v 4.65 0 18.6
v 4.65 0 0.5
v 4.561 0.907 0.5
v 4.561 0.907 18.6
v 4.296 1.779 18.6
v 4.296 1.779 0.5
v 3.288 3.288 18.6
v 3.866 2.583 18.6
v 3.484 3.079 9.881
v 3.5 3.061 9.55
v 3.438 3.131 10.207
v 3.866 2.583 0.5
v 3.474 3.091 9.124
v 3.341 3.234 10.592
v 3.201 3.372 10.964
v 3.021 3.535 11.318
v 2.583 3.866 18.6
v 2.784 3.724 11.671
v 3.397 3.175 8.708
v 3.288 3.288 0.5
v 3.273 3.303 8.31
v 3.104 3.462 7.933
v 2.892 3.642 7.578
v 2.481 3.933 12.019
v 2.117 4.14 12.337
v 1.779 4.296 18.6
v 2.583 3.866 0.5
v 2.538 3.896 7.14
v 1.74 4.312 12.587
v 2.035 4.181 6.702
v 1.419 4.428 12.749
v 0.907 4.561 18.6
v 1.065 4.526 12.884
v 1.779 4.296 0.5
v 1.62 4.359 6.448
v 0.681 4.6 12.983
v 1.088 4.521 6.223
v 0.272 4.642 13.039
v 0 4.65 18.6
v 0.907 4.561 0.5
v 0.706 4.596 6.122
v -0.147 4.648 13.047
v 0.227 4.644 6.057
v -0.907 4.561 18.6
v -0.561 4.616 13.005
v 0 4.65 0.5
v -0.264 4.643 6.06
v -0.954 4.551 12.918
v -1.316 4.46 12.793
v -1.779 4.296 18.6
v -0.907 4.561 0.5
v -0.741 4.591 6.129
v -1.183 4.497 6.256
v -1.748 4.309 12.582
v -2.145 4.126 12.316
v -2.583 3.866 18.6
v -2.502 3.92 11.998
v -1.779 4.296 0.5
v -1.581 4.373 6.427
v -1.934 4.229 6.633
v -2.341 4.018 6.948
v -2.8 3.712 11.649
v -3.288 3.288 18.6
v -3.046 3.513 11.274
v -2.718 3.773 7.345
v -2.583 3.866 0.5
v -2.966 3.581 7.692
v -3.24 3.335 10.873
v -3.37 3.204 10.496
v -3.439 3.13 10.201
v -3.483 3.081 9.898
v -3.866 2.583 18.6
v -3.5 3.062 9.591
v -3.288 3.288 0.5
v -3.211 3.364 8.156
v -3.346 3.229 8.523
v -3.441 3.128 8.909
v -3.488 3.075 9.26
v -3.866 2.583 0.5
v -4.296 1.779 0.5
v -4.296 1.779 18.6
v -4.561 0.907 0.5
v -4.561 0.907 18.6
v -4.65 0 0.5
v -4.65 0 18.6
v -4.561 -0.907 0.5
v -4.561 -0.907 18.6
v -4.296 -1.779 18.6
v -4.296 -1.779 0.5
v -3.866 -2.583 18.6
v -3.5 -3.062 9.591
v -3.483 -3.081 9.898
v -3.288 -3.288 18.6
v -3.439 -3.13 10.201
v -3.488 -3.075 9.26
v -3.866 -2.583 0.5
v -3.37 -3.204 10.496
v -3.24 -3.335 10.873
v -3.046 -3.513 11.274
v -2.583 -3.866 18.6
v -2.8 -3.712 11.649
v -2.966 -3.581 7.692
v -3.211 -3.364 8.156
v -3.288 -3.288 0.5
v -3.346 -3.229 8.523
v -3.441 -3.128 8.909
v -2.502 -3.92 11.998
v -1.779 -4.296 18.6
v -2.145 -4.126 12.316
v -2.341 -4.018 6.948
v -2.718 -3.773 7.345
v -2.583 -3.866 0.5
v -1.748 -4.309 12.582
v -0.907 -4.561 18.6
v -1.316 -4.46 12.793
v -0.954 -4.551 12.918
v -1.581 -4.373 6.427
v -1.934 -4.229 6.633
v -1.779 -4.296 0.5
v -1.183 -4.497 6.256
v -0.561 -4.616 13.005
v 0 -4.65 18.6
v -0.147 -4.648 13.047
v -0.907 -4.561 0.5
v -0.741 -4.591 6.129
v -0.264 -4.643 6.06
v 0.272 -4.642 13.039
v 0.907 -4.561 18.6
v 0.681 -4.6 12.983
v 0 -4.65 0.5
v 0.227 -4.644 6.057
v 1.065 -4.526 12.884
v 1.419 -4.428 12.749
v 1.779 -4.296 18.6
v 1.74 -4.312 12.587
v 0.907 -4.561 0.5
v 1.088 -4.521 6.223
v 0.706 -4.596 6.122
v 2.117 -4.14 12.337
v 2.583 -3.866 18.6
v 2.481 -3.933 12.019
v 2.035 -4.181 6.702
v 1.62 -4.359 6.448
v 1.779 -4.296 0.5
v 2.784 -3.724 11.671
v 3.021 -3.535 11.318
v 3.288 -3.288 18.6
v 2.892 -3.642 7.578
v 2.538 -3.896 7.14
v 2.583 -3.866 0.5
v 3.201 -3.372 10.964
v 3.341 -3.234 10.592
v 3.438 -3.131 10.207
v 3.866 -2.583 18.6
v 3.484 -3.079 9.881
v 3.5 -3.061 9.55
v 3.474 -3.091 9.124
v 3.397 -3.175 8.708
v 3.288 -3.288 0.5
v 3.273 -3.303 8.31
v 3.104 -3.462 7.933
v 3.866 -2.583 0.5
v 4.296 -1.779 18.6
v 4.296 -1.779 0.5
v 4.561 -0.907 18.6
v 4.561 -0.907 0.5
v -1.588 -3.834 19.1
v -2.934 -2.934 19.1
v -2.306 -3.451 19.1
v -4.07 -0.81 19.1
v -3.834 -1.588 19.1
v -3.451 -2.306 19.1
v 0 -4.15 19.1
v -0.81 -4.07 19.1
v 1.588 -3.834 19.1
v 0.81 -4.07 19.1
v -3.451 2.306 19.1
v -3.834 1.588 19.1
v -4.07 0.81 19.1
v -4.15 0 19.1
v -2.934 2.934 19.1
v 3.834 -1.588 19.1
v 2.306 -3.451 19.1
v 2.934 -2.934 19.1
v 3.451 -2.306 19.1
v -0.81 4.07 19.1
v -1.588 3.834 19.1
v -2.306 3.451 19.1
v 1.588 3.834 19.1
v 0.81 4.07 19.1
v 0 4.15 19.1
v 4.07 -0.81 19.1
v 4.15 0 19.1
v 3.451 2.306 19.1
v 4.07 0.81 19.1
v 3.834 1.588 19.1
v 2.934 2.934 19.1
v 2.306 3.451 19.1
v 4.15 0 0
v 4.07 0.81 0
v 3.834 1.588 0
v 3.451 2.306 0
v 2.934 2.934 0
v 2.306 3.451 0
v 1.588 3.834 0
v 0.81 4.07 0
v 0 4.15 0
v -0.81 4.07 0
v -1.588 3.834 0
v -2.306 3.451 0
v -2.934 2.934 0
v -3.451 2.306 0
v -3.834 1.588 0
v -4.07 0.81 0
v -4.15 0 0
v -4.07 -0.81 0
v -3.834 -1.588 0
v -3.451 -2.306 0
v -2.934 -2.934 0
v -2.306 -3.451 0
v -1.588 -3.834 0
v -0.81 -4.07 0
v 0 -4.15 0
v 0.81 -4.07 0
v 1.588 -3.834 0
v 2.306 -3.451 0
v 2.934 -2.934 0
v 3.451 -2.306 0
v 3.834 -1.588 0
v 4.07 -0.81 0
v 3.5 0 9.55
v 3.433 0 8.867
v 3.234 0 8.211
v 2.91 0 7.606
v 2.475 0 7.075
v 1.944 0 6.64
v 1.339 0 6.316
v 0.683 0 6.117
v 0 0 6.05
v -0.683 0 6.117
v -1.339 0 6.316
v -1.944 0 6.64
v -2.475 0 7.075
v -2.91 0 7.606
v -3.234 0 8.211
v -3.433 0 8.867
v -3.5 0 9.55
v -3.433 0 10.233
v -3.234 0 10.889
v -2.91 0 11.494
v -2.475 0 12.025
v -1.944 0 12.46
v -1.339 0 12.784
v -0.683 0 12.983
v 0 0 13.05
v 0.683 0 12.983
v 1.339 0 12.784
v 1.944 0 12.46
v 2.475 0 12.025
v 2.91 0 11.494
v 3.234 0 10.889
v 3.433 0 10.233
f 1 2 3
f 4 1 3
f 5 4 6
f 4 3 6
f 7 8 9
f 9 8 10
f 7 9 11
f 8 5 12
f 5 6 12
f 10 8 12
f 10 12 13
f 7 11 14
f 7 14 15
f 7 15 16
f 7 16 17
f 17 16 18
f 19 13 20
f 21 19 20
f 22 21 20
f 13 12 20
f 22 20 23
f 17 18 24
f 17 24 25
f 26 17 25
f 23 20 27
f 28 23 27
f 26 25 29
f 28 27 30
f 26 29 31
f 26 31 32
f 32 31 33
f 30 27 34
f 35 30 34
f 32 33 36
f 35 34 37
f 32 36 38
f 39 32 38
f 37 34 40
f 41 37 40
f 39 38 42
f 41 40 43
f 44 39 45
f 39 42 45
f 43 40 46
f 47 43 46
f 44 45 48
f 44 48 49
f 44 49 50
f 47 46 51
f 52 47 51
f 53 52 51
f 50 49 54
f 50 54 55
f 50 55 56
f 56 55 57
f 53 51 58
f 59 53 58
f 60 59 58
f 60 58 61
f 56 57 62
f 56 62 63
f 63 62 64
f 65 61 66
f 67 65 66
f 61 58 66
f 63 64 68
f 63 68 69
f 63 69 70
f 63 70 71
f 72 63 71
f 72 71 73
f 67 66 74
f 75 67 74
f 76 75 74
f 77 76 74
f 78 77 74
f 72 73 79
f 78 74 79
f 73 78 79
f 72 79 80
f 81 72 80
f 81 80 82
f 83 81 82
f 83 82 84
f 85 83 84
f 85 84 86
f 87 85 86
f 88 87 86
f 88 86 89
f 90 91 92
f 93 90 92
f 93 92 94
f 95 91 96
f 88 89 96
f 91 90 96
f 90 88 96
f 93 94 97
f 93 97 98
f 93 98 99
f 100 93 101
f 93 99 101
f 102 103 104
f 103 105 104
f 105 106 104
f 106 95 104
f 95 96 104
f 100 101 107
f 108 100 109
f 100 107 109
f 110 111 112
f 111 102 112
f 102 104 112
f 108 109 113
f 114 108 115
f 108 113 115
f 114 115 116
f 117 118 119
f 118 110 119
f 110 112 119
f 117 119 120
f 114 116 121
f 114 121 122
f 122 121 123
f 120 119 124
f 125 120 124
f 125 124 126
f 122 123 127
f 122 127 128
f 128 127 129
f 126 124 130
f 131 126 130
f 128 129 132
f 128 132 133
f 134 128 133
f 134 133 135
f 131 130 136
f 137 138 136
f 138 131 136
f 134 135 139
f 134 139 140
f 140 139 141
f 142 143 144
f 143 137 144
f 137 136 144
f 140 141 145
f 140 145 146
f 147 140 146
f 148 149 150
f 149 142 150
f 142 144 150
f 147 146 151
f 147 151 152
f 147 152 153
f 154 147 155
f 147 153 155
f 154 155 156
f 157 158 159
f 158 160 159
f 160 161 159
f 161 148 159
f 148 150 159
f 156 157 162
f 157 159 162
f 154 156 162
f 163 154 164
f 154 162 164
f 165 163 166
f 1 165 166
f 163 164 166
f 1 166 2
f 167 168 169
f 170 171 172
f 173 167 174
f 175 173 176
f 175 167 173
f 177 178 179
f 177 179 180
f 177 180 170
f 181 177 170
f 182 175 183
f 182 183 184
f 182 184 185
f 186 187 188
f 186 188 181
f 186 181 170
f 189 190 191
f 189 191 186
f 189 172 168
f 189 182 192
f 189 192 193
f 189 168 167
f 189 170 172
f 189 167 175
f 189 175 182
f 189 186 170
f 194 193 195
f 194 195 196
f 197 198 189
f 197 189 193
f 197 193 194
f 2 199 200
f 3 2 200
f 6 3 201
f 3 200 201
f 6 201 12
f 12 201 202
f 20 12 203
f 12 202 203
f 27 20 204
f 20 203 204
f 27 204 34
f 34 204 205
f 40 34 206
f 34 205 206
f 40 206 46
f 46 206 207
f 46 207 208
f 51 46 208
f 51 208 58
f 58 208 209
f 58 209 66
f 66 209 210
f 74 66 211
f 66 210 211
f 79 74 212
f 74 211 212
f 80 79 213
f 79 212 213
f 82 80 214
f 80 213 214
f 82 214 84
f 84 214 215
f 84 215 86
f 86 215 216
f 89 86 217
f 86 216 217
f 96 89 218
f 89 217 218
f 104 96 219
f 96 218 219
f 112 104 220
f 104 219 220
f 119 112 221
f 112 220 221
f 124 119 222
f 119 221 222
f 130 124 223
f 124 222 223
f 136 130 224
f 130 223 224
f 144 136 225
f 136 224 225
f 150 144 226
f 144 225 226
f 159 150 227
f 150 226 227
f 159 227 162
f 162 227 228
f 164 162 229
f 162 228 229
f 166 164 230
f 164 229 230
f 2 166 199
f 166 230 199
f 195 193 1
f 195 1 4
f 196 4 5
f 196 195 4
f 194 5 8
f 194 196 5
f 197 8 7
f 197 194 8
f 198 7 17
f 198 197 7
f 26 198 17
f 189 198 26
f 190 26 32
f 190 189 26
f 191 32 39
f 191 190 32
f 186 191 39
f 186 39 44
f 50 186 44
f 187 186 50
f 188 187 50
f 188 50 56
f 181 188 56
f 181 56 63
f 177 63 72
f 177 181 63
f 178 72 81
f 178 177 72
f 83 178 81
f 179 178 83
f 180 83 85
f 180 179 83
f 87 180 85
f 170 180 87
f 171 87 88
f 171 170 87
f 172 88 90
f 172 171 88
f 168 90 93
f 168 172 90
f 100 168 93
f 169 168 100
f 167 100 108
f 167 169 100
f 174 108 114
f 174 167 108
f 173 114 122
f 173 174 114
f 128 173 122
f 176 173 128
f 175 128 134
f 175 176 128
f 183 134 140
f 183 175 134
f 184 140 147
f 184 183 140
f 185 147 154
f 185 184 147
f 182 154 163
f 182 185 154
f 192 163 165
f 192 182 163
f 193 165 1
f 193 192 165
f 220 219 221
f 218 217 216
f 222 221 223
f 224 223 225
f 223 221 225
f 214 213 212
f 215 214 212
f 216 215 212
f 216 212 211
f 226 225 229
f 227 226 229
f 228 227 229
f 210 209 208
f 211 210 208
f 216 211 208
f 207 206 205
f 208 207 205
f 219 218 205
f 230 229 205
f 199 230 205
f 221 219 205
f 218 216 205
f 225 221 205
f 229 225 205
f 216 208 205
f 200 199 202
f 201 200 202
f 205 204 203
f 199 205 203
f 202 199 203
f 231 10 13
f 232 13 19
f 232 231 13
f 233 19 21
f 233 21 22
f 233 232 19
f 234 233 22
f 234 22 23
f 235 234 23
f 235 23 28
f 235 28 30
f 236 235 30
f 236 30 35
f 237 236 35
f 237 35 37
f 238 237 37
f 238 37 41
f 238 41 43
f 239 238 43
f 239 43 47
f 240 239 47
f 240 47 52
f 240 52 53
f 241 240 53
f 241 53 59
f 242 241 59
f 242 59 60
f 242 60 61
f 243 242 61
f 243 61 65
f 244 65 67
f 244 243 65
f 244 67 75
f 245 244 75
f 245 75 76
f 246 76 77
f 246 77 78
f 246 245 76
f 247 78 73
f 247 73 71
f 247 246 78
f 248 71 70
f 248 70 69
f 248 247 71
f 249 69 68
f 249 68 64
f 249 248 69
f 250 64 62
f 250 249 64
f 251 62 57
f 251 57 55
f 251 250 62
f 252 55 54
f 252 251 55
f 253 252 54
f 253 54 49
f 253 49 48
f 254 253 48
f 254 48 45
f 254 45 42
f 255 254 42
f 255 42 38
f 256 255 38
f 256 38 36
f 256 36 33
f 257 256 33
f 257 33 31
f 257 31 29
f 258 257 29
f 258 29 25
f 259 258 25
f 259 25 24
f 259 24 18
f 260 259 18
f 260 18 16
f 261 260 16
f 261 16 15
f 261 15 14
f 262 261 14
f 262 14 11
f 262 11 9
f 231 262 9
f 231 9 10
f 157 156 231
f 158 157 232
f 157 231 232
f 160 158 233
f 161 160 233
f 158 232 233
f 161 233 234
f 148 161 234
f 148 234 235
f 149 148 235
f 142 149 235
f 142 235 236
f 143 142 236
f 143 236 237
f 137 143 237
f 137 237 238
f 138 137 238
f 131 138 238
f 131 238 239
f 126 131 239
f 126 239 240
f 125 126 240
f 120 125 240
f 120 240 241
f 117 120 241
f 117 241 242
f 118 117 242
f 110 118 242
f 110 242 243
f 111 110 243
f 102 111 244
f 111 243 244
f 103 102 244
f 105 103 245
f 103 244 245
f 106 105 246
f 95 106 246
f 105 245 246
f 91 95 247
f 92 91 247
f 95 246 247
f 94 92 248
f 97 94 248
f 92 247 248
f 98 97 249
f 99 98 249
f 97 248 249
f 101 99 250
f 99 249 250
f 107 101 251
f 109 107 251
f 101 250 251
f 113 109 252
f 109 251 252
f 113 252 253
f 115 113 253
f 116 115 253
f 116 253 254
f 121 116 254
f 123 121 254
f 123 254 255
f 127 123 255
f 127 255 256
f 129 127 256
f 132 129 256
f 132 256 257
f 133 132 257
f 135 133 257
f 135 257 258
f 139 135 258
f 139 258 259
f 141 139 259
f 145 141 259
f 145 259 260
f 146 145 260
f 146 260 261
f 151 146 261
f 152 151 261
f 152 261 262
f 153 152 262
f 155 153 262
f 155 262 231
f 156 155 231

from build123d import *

# Parameters (mm, degrees)
SKETCH1_R               = 4.65
BOSS_EXTRUDE1_DEPTH     = 19.1
SKETCH2_R               = 3.5
CUT_EXTRUDE1_DEPTH      = 5.65
CUT_EXTRUDE1_DEPTH_BACK = 5.65
CHAMFER1_SIZE           = 0.5


with BuildPart() as part:
    # Sketch1 → Boss-Extrude1 (new body)
    with BuildSketch(Plane.XY):
        Circle(SKETCH1_R)
    extrude(amount=BOSS_EXTRUDE1_DEPTH)

    # Sketch2 → Cut-Extrude1 (cut, two sides)
    with BuildSketch(Plane(origin=(0, 0, 0), x_dir=(1, 0, 0), z_dir=(0, 1, 0))) as cut_extrude1_sk:
        with Locations((0, -9.55)):
            Circle(SKETCH2_R)
    extrude(amount=CUT_EXTRUDE1_DEPTH, mode=Mode.SUBTRACT)
    extrude(cut_extrude1_sk.sketch, amount=-CUT_EXTRUDE1_DEPTH_BACK, mode=Mode.SUBTRACT)

    # Chamfer1
    chamfer1_edges = [part.edges().sort_by_distance(p)[0] for p in [
        (-4.65, 0, 0),
        (-4.65, 0, 19.1),
    ]]
    chamfer(chamfer1_edges, length=CHAMFER1_SIZE)


solid = part.part
